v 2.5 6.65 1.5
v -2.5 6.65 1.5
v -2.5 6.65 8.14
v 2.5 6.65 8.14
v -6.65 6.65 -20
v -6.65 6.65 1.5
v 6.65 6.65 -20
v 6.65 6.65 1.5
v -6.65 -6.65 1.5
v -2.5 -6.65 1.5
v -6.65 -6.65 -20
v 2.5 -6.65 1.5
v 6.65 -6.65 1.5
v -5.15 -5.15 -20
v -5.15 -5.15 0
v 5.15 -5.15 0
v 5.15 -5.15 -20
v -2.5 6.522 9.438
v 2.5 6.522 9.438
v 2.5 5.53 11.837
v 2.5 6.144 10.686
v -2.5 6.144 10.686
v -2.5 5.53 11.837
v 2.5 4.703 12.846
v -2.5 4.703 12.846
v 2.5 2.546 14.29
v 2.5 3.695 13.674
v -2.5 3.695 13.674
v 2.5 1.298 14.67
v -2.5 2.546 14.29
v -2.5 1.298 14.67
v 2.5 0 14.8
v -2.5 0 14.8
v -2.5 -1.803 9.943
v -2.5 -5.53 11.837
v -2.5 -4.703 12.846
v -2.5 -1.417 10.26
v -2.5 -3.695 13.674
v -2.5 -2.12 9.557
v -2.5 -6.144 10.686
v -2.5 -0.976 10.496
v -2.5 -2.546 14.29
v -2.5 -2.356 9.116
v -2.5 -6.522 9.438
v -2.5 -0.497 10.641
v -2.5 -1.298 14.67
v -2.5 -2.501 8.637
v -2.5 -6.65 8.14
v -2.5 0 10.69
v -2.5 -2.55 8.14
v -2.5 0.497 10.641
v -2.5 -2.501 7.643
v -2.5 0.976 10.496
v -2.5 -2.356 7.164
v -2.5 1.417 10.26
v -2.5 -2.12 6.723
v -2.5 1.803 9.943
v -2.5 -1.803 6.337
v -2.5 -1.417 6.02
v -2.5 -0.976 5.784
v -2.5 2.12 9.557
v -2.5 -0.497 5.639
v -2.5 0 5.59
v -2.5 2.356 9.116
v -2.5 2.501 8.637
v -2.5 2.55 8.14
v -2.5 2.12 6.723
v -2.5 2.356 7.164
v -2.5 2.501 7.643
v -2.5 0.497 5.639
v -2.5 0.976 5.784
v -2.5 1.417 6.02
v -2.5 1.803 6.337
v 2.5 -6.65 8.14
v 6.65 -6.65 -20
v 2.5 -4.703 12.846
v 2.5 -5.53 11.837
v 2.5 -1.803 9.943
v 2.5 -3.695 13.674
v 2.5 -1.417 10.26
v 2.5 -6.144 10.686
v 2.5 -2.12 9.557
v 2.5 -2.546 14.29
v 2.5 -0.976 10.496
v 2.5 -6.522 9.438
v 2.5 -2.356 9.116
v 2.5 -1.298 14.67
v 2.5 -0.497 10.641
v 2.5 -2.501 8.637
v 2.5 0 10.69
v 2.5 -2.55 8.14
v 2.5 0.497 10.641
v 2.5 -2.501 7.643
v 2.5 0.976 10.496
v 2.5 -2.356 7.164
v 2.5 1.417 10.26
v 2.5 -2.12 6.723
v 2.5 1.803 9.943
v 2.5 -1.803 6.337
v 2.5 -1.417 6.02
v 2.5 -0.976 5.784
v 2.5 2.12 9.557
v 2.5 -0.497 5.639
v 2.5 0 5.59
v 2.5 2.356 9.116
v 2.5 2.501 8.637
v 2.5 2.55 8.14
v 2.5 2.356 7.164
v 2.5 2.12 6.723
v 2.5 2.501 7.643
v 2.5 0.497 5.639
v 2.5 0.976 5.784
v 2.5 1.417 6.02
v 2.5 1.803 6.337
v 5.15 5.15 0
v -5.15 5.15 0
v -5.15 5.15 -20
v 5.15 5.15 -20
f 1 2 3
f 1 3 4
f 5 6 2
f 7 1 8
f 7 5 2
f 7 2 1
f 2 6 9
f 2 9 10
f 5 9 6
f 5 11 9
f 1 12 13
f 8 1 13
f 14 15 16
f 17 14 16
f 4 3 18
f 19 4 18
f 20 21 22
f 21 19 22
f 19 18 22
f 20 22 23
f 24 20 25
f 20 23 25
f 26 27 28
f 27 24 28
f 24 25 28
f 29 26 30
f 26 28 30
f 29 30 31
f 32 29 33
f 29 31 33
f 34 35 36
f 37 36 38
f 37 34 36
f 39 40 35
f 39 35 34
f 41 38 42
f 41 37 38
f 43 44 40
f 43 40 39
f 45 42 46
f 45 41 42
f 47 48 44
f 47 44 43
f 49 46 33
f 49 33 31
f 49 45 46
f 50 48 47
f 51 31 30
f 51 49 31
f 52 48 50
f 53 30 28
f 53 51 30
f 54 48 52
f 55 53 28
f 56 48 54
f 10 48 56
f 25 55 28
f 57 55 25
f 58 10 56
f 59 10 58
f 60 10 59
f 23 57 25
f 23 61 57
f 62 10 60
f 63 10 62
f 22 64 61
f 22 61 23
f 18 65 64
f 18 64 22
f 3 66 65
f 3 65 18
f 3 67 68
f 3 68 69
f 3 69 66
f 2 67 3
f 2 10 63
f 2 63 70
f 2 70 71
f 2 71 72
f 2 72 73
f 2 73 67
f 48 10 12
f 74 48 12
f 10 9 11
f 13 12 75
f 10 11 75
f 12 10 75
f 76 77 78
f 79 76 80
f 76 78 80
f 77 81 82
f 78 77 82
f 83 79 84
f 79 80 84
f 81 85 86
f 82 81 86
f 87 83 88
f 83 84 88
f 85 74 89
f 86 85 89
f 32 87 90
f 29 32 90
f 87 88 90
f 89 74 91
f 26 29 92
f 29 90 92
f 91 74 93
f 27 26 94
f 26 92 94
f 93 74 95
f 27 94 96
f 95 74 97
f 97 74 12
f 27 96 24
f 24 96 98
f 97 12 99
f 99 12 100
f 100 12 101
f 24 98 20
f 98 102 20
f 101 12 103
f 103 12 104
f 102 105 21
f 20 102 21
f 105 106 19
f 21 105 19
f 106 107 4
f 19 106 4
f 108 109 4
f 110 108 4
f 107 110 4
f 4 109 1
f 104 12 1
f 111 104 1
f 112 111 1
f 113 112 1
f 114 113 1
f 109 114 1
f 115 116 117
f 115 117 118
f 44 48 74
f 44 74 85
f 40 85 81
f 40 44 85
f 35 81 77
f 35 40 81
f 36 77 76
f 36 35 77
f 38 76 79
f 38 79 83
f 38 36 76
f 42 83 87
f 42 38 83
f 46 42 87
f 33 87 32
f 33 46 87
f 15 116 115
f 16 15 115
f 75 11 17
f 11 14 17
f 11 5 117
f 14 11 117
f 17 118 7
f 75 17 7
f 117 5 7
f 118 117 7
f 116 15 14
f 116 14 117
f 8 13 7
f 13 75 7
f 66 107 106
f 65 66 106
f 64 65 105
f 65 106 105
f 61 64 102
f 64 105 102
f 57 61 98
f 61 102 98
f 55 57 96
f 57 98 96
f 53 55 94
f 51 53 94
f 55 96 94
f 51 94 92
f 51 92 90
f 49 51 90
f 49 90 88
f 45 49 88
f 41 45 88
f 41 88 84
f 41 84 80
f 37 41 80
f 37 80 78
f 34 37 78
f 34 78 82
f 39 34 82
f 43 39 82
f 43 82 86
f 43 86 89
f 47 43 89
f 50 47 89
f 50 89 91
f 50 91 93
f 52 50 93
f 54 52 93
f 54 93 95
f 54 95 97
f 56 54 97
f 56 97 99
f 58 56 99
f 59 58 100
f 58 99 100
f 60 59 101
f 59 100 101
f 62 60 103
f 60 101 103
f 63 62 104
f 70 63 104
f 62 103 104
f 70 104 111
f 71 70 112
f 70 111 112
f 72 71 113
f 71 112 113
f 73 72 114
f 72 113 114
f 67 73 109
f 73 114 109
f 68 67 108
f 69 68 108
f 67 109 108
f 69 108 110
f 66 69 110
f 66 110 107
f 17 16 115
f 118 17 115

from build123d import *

# Parameters (mm, degrees)
F0_W          = 13.3
F0_H          = 13.3
F0_W_2        = 10.3
F0_H_2        = 10.3
F1_DEPTH      = 20
F2_DEPTH      = 1.5
F3_W          = 5
F3_H          = 13.3
F4_DEPTH      = 13.3
F5_T1_DEPTH   = 38.3
F6_R          = 2.55
F7_DEPTH      = 25
F7_DEPTH_BACK = 25


# Not quite as in the source:
# - a fillet or chamfer that OpenCascade refuses, or shapes differently, is made with other operations: its cross-section is extruded or revolved along the edge and cut away or added


with BuildPart() as f1:
    # F0 (on Top) → F1 (new body)
    with BuildSketch(Plane.XY):
        Rectangle(F0_W, F0_H)
        Rectangle(F0_W_2, F0_H_2, mode=Mode.SUBTRACT)
    extrude(amount=-F1_DEPTH)

    # F0 (on Top) → F2 (join)
    with BuildSketch(Plane.XY):
        Rectangle(F0_W, F0_H)
        Rectangle(F0_W_2, F0_H_2, mode=Mode.SUBTRACT)
        Rectangle(F0_W_2, F0_H_2)
    extrude(amount=F2_DEPTH)

    # F3 (on face) → F4 (join)
    with BuildSketch(Plane.XY.offset(1.5)):
        Rectangle(F3_W, F3_H)
    extrude(amount=F4_DEPTH)

    # F5: fillet of radius 6.66 on 2 edges, made by hand

    # F5_s2 → F5_t1 (cut)
    with BuildSketch(Plane.YZ.offset(-19.15)):
        with BuildLine():
            ThreePointArc((-6.65, 8.14), (-4.6993311627, 12.8493311627), (0.01, 14.8))
            Line((0.01, 14.8), (-6.65, 14.8))
            Line((-6.65, 14.8), (-6.65, 8.14))
        make_face()
        with BuildLine():
            ThreePointArc((6.65, 8.14), (4.6993311627, 12.8493311627), (-0.01, 14.8))
            Line((-0.01, 14.8), (6.65, 14.8))
            Line((6.65, 14.8), (6.65, 8.14))
        make_face()
    extrude(amount=F5_T1_DEPTH, mode=Mode.SUBTRACT)

    # F6 (on face) → F7 (cut, two sides)
    with BuildSketch(Plane.YZ.offset(2.5)) as f7_sk:
        with Locations((0, 8.14)):
            Circle(F6_R)
    extrude(amount=-F7_DEPTH, mode=Mode.SUBTRACT)
    extrude(f7_sk.sketch, amount=F7_DEPTH_BACK, mode=Mode.SUBTRACT)


solid = f1.part
